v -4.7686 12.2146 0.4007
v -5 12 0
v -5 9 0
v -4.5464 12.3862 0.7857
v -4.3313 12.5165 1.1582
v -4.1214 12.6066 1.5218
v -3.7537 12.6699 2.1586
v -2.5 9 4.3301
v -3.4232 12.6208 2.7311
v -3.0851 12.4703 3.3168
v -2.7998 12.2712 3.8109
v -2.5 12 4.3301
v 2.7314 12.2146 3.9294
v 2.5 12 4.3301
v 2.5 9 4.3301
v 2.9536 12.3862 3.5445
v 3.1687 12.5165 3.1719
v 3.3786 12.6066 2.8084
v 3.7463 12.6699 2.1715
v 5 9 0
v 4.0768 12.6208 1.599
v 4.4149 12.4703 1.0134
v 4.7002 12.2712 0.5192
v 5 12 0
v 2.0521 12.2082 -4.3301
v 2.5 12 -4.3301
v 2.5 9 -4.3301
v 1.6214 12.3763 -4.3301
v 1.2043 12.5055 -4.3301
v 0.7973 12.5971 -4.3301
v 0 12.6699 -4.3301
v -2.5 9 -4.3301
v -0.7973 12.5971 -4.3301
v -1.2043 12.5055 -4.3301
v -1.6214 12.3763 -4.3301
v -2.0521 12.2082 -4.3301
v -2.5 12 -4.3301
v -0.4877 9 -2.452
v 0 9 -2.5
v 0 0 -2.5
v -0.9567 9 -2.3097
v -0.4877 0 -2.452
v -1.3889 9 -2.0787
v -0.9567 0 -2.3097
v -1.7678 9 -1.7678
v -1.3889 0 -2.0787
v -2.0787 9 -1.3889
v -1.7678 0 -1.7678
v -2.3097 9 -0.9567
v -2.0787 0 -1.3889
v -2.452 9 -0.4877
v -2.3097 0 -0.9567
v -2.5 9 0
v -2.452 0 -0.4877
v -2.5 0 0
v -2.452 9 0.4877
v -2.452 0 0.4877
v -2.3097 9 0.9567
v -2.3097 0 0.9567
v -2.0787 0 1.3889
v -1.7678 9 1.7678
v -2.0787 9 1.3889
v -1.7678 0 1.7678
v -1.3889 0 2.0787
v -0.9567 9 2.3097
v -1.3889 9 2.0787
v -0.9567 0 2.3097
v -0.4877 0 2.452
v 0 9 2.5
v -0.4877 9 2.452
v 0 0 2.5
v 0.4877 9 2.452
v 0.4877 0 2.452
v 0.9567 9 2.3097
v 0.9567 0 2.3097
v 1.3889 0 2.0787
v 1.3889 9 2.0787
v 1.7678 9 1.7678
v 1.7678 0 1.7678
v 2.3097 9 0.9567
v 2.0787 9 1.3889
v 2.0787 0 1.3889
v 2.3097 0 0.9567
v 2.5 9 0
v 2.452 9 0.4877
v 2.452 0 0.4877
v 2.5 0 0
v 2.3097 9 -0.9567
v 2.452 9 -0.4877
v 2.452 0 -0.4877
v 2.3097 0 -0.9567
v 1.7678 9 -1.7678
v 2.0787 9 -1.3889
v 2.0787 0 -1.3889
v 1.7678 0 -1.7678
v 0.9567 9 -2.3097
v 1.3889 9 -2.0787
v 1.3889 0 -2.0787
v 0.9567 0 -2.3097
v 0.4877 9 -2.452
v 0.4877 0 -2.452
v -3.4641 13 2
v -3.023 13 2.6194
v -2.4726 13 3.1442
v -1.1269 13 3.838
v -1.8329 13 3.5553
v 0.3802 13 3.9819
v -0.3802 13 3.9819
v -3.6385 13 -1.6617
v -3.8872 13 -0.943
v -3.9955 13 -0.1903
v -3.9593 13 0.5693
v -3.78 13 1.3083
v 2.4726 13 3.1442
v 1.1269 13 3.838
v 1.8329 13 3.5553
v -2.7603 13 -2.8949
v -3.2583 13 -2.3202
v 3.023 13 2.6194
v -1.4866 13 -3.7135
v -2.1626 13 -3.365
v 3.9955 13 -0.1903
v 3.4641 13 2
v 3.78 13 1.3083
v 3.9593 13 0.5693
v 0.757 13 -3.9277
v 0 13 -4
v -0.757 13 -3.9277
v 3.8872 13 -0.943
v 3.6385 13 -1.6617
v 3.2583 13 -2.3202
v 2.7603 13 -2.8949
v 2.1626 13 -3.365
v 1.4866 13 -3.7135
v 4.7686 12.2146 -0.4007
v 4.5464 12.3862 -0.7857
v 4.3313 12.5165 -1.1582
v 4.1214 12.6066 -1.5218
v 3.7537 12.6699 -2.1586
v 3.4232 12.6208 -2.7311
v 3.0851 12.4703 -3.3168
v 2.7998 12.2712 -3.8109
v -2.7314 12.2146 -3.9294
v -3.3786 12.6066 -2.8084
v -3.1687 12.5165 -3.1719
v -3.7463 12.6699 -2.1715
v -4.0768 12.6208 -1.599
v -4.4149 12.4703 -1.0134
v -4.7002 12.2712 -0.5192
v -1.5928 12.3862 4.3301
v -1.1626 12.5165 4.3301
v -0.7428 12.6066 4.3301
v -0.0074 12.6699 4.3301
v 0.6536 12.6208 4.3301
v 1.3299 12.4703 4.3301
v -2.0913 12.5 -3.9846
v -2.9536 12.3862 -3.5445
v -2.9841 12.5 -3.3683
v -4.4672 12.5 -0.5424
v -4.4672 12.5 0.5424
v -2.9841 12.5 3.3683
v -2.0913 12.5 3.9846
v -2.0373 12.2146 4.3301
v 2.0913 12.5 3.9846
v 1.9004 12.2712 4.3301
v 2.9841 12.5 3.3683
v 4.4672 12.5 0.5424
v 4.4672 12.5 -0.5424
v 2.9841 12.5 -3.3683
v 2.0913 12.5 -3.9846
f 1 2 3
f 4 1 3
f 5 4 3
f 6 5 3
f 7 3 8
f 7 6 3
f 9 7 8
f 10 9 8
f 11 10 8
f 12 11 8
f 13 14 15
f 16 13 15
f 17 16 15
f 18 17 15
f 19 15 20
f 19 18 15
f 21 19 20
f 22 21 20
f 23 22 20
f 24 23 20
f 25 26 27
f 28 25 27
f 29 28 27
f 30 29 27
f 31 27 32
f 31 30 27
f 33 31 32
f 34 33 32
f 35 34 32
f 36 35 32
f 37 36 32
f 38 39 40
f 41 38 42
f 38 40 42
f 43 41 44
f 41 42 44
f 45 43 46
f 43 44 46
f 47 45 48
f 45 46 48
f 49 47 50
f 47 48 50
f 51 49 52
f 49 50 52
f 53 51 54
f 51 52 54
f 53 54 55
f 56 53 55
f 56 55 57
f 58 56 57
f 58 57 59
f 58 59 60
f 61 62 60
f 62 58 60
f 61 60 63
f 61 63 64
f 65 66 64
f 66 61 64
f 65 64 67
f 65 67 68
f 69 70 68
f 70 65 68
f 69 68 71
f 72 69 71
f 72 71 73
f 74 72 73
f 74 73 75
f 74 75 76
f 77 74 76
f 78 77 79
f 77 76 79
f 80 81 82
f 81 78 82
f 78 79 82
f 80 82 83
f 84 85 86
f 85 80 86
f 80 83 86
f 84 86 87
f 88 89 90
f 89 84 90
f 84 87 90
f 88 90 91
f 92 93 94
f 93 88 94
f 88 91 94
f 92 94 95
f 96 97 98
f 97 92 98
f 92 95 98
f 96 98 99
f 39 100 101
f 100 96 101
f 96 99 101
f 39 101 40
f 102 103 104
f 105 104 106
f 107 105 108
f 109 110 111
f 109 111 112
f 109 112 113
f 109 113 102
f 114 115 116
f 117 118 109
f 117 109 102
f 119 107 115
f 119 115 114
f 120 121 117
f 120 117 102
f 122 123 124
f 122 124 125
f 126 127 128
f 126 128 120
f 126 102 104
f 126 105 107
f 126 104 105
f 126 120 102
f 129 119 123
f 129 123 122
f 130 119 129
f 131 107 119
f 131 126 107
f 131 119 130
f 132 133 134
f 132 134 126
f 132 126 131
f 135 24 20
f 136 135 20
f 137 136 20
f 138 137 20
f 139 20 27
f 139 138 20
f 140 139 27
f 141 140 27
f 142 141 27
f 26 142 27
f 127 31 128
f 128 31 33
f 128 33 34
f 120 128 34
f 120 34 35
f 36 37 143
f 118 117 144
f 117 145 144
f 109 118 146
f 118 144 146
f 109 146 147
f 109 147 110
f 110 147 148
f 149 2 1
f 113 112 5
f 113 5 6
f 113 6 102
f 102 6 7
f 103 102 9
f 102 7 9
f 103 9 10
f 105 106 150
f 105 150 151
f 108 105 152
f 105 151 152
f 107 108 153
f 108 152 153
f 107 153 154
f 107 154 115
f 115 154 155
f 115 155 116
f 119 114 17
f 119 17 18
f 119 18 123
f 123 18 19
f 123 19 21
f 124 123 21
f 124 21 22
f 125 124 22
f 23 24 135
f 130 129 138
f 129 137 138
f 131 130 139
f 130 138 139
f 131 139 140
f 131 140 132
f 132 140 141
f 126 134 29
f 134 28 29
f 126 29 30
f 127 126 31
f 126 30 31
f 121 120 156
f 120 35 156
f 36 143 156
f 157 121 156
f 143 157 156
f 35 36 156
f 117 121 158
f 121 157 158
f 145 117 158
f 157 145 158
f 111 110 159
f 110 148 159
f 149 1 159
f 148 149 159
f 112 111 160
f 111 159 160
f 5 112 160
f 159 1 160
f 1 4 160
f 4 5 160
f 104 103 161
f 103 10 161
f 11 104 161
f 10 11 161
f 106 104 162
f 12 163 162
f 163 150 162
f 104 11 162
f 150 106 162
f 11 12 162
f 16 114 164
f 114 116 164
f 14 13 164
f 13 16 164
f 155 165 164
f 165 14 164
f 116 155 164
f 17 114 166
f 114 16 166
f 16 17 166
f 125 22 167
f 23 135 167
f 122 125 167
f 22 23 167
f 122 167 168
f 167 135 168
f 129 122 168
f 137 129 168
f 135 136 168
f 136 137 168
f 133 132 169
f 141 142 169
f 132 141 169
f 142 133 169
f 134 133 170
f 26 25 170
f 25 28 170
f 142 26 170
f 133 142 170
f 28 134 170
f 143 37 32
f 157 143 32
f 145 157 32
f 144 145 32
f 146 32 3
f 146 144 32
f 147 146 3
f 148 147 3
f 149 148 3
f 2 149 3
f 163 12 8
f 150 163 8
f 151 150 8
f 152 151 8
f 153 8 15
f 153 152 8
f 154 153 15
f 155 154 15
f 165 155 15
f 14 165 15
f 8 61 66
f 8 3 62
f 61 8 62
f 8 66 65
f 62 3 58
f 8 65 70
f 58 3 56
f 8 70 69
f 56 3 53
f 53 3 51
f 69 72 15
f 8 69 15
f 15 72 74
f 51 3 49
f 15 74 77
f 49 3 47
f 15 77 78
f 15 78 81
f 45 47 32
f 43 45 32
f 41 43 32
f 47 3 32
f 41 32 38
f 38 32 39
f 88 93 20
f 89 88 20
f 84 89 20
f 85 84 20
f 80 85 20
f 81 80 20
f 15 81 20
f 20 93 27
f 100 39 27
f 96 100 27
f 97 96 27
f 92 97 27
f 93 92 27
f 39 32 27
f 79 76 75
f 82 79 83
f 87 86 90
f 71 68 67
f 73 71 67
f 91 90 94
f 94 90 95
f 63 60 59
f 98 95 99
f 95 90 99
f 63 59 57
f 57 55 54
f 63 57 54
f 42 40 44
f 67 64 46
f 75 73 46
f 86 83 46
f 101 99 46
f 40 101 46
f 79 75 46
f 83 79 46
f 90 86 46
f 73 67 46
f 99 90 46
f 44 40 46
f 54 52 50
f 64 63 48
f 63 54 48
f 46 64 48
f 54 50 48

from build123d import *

# Parameters (mm, degrees)
SKETCH1_R           = 2.5
BOSS_EXTRUDE1_DEPTH = 13
BOSS_EXTRUDE2_DEPTH = 4


with BuildPart() as part:
    # Sketch1 → Boss-Extrude1 (new body)
    with BuildSketch(Plane(origin=(0, 0, 0), x_dir=(1, 0, 0), z_dir=(0, 1, 0))):
        with Locations(Location((0, 0, 0), (0, 0, 90))):
            Circle(SKETCH1_R)
    extrude(amount=BOSS_EXTRUDE1_DEPTH)

    # Sketch2 → Boss-Extrude2 (add)
    with BuildSketch(Plane(origin=(0, 13, 0), x_dir=(1, 0, 0), z_dir=(0, 1, 0))):
        Polygon((5, 0), (2.5, 4.330127019), (-2.5, 4.330127019), (-5, 0), (-2.5, -4.330127019), (2.5, -4.330127019), align=None)
    extrude(amount=-BOSS_EXTRUDE2_DEPTH)

    # Sketch3 → Cut-Revolve1 (revolve, cut)
    with BuildSketch(Plane.XY, mode=Mode.PRIVATE) as cut_revolve1_sk:
        Polygon((4, 13), (5, 12), (5, 13), align=None)
    revolve(cut_revolve1_sk.sketch.rotate(Axis((0, 0, 0), (0, 1, 0)), 90), axis=Axis((0, 0, 0), (0, 1, 0)), mode=Mode.SUBTRACT)


solid = part.part
